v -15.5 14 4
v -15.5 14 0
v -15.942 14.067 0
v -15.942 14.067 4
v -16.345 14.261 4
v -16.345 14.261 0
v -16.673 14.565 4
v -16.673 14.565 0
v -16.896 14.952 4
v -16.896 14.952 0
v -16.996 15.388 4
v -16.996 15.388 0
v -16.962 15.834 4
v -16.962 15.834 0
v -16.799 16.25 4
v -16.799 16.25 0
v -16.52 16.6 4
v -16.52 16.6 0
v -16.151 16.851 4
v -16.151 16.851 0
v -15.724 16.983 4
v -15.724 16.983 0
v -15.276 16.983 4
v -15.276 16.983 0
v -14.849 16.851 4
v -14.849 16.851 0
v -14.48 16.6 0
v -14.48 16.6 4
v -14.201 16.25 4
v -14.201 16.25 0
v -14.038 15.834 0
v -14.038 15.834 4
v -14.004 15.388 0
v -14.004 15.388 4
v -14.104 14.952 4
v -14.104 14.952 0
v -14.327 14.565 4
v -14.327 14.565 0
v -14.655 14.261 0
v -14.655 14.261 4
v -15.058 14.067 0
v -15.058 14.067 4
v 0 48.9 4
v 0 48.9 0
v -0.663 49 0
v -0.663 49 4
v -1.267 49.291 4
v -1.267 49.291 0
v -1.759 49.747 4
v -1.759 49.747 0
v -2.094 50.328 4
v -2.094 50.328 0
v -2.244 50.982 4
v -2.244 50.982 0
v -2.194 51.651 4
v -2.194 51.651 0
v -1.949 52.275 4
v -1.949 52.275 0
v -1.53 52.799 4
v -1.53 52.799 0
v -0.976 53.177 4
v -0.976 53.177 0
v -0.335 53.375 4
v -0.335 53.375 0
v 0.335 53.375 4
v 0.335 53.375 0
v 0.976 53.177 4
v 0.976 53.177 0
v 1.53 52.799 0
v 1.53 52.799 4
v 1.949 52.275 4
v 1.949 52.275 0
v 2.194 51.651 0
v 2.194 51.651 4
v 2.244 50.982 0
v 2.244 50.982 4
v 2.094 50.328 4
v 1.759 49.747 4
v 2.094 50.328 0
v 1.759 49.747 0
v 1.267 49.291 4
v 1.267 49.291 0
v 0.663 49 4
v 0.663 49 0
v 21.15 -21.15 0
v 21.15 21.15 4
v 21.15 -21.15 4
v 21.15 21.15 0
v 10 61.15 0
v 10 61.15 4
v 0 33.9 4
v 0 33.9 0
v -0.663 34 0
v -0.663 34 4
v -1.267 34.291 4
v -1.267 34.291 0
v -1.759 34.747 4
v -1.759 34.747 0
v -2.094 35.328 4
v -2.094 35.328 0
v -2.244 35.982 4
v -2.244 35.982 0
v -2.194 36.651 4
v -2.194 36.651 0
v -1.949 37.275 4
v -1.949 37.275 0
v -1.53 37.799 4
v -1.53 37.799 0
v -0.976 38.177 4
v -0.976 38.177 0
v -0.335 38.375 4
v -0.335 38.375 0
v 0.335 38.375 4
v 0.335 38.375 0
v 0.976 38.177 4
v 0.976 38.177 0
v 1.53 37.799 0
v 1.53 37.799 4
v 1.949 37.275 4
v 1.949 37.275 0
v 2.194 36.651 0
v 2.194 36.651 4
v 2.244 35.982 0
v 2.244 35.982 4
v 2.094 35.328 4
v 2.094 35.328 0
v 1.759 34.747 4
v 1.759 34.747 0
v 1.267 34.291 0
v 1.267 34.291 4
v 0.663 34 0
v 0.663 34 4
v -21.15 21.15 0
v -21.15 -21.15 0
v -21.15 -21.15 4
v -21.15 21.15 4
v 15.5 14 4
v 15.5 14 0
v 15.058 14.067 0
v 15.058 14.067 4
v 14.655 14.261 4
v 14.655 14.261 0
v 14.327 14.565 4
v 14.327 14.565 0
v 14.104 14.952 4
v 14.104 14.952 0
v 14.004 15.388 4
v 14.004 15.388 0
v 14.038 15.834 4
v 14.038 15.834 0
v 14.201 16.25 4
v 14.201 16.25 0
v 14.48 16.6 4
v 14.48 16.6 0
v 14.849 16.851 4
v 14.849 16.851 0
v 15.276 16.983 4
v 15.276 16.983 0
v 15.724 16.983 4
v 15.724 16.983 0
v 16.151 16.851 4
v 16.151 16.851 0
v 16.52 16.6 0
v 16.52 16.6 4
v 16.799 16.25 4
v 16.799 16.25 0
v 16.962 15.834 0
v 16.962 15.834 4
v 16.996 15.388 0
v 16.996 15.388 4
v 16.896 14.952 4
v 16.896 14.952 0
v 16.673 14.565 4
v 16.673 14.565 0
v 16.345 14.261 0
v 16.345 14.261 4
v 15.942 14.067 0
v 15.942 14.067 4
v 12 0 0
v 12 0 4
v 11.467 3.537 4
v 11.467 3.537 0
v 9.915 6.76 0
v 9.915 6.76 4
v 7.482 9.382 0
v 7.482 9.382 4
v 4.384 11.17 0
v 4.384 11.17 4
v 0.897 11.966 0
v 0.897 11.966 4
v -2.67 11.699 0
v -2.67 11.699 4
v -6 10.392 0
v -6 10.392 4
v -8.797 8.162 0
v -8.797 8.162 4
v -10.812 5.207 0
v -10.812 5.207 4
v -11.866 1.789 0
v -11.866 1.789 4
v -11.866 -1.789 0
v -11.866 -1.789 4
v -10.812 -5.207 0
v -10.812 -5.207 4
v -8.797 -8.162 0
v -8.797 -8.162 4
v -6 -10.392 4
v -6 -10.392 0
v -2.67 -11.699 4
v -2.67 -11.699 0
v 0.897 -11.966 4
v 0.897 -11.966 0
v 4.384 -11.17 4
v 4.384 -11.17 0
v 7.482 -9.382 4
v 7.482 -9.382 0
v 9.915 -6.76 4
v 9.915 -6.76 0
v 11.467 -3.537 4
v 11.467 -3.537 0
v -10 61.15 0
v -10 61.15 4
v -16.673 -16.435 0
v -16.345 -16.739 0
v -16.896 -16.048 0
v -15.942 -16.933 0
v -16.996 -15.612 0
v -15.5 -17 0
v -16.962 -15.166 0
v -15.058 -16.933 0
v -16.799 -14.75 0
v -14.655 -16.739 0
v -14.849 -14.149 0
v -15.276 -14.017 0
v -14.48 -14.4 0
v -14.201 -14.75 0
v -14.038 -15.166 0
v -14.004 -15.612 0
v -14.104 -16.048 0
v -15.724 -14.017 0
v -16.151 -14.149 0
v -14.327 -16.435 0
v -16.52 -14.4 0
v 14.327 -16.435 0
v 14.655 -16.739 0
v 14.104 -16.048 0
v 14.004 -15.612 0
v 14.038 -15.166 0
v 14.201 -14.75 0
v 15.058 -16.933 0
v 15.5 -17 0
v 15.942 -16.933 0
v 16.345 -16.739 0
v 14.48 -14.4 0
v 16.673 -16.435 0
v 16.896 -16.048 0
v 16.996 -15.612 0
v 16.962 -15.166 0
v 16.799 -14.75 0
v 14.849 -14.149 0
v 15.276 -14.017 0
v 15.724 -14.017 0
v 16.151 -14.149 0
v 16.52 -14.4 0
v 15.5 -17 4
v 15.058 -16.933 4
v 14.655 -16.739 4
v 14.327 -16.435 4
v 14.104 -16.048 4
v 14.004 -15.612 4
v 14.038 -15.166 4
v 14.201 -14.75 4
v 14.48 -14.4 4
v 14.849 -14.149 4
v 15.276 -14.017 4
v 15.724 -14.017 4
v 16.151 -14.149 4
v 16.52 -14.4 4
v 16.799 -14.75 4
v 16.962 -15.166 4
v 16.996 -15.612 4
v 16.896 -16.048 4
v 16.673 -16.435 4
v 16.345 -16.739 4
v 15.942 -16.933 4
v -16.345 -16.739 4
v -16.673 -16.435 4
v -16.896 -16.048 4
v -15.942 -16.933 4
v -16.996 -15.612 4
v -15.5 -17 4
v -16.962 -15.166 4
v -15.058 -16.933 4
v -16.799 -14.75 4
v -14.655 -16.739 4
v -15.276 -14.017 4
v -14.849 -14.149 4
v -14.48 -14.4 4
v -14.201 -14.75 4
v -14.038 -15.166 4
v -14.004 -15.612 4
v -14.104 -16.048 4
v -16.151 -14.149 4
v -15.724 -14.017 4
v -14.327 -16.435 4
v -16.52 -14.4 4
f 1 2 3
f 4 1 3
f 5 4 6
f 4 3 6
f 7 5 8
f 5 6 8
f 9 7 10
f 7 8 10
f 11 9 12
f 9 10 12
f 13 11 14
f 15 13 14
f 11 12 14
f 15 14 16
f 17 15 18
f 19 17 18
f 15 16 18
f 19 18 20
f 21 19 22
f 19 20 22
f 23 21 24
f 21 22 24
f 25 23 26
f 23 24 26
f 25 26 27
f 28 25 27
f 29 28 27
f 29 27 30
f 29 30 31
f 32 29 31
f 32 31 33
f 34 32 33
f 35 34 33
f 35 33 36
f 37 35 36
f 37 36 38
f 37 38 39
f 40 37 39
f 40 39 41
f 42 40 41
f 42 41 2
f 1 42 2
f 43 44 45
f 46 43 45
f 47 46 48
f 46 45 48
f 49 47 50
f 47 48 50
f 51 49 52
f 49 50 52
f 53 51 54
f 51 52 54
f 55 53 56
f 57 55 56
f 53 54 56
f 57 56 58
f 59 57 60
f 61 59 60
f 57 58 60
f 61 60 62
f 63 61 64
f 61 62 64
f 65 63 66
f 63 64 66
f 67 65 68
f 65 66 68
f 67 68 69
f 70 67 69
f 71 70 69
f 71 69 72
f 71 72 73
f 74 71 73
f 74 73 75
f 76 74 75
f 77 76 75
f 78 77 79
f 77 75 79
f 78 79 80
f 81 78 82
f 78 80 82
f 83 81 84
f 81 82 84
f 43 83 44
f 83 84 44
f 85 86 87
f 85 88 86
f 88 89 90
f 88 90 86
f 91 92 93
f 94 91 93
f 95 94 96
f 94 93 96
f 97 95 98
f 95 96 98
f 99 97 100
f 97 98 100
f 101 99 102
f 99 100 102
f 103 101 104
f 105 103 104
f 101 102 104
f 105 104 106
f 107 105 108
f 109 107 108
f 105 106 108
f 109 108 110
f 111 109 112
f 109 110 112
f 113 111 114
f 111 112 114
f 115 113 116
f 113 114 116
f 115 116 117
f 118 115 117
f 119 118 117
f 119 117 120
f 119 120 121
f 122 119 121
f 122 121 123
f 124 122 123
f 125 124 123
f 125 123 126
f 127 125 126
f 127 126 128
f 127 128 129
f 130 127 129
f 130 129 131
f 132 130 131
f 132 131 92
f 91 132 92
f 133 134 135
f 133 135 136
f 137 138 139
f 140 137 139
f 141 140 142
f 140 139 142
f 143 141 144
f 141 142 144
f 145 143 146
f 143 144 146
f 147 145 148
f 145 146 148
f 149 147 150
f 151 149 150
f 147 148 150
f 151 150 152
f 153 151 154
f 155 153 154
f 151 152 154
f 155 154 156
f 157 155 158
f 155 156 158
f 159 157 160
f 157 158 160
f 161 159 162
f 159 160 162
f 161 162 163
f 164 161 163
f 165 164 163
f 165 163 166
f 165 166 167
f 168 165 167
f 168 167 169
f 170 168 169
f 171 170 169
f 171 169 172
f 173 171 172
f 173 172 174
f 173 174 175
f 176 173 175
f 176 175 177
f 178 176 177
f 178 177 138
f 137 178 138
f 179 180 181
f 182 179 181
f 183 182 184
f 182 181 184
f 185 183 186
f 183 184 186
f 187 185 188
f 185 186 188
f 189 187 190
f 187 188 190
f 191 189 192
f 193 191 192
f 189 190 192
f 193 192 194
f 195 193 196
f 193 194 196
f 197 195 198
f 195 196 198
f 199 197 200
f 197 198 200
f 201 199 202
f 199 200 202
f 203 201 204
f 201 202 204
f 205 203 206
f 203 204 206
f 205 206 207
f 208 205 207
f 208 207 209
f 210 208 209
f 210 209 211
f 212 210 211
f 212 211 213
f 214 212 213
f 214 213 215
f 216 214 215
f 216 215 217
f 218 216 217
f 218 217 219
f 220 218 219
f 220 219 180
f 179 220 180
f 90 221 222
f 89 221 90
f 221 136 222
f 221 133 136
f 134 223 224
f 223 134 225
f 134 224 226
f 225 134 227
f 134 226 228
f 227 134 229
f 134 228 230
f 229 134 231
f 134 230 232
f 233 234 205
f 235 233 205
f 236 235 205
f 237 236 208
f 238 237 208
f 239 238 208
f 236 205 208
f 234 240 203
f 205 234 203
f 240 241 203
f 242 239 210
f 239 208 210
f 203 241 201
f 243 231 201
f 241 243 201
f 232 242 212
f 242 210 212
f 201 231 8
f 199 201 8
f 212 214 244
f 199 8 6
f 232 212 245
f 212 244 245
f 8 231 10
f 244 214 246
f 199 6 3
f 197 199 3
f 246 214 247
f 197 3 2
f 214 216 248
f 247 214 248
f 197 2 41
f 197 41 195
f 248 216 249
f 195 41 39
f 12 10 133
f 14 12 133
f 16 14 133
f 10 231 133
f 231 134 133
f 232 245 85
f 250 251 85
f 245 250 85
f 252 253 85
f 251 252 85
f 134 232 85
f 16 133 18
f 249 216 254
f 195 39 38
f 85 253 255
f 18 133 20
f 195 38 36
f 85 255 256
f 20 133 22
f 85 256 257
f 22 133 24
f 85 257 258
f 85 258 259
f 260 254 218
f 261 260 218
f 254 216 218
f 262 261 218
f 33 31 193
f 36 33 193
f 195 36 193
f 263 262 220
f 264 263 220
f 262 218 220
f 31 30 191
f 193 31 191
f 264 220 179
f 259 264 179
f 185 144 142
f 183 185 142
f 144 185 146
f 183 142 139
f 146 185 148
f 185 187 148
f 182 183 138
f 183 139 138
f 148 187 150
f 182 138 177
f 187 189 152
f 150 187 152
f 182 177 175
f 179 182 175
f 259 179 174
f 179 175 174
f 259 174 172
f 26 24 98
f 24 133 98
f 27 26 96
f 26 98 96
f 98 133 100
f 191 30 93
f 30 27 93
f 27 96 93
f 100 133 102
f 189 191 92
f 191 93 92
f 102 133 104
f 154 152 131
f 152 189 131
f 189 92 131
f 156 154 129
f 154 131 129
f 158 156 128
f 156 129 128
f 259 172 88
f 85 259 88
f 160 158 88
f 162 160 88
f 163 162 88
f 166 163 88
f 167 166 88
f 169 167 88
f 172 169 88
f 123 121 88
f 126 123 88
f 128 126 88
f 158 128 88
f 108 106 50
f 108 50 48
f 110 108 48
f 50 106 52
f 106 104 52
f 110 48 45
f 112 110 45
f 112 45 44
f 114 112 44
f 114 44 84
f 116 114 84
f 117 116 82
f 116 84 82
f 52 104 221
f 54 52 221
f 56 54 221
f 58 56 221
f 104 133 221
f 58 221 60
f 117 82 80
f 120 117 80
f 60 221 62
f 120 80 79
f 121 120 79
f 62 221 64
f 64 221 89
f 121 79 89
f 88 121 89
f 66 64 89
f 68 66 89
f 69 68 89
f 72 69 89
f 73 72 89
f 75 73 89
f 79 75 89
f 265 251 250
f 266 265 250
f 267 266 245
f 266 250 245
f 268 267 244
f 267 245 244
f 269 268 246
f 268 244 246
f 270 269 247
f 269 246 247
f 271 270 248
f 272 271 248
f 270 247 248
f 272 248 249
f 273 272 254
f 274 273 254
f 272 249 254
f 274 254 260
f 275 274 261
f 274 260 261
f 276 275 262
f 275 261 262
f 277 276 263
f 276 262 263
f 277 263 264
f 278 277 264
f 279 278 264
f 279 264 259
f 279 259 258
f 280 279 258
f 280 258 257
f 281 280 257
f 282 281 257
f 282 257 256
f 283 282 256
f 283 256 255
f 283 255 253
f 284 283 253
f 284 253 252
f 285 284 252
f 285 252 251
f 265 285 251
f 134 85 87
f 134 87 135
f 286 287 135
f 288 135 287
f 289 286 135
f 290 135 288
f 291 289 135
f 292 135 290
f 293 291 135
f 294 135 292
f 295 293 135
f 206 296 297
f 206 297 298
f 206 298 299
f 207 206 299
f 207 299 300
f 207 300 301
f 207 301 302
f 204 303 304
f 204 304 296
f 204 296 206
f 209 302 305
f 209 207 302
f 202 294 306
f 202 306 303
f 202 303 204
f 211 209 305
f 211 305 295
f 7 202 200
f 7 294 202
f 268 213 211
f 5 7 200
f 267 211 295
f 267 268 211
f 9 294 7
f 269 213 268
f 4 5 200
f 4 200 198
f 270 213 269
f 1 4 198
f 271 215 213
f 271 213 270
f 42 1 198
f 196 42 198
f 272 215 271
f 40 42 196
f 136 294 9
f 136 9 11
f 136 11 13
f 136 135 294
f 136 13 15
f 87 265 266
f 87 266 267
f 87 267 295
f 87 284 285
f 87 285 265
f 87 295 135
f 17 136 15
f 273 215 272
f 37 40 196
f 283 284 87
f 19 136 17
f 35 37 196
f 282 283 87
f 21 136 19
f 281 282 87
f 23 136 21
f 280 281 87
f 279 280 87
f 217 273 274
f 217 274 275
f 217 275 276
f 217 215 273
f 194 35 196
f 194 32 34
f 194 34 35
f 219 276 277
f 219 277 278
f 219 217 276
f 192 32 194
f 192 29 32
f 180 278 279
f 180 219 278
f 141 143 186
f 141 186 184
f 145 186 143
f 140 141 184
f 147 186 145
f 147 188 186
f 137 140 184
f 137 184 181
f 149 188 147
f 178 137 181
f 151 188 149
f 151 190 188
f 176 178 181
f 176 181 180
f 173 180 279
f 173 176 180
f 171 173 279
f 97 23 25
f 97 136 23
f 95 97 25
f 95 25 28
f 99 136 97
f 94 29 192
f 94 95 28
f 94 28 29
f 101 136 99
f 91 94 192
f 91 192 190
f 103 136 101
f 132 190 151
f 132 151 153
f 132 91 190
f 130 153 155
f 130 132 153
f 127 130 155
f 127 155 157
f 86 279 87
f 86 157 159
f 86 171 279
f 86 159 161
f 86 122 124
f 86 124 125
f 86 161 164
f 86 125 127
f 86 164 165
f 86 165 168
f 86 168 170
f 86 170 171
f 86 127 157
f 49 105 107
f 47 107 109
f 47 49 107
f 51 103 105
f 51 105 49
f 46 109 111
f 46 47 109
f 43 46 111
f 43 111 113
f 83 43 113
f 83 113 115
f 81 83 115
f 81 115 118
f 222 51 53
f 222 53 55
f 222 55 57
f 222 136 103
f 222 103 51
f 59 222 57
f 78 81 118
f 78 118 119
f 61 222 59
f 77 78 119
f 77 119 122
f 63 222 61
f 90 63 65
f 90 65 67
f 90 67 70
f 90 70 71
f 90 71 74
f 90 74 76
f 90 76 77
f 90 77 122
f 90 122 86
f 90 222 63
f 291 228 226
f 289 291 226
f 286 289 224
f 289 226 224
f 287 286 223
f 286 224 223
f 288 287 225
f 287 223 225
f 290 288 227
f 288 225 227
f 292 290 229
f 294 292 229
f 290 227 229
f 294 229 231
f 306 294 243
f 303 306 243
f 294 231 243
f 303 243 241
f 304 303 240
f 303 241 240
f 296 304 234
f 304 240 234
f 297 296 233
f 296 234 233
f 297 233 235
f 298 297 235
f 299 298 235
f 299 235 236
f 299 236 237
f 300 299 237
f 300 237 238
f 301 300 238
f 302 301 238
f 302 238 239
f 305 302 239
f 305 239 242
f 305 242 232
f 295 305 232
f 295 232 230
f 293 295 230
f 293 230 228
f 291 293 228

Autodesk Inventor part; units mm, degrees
ref_plane "YZ Plane" through (0, 0, 0) normal (1, 0, 0) x (0, 1, 0)
ref_plane "XZ Plane" through (0, 0, 0) normal (0, 1, 0) x (-1, 0, 0)
ref_plane "XY Plane" through (0, 0, 0) normal (0, 0, 1) x (1, 0, 0)
sketch "Sketch1" plane through (0, 0, 0) normal (0, 0, 1) x (1, 0, 0)
  line L0 (21.15, 21.15) -> (21.15, -21.15)
  line L1 (21.15, -21.15) -> (-21.15, -21.15)
  line L2 (-21.15, -21.15) -> (-21.15, 21.15)
  line L3 (-21.15, 21.15) -> (-10, 61.15)
  line L4 (-10, 61.15) -> (10, 61.15)
  line L5 (10, 61.15) -> (21.15, 21.15)
  point P0 (0, 0)
  point P1 (21.15, 0)
  point P2 (0, 61.15)
  dimension "d0" = 42.3
  dimension "d1" = 42.3
  dimension "d2" = 20
  dimension "d4" = 42.3
  dimension "d5" = 40
  dimension "d7" = 11.15
extrude "Extrusion1" add sketch "Sketch1" along normal blind 4
sketch "Sketch2" plane through (0, 0, 4) normal (0, 0, 1) x (1, 0, 0)
  line L0 (10, 61.15) -> (-10, 61.15) projected
  point P0 (0, 0)
  point P1 (0, 51.15)
  point P2 (0, 36.15)
  dimension "d10" = 10
  dimension "d11" = 15
hole "Hole1" at (0, 51.15, 4) at (0, 36.15, 4) direction (0, 0, -1) diameter 4.5 end through all
sketch "Sketch3" plane through (0, 0, 4) normal (0, 0, 1) x (1, 0, 0)
  circle A0 centre (0, 0) radius 12
  dimension "d19" = 24
extrude "Extrusion2" cut sketch "Sketch3" against normal through all
sketch "Sketch4" plane through (0, 0, 4) normal (0, 0, 1) x (1, 0, 0)
  line L0 (-21.15, 21.15) -> (-21.15, -21.15) projected
  line L1 (-21.15, -21.15) -> (21.15, -21.15) projected
  point P0 (0, 0)
  point P1 (-15.5, 15.5)
  point P2 (15.5, 15.5)
  point P3 (15.5, -15.5)
  point P4 (-15.5, -15.5)
  dimension "d22" = 31
  dimension "d23" = 31
  dimension "d24" = 5.65
  dimension "d25" = 5.65
hole "Hole2" at (-15.5, 15.5, 4) at (15.5, 15.5, 4) at (15.5, -15.5, 4) at (-15.5, -15.5, 4) direction (0, 0, -1) diameter 3 end through all
properties part number "Stepper Motor to Extrusion Clip"
